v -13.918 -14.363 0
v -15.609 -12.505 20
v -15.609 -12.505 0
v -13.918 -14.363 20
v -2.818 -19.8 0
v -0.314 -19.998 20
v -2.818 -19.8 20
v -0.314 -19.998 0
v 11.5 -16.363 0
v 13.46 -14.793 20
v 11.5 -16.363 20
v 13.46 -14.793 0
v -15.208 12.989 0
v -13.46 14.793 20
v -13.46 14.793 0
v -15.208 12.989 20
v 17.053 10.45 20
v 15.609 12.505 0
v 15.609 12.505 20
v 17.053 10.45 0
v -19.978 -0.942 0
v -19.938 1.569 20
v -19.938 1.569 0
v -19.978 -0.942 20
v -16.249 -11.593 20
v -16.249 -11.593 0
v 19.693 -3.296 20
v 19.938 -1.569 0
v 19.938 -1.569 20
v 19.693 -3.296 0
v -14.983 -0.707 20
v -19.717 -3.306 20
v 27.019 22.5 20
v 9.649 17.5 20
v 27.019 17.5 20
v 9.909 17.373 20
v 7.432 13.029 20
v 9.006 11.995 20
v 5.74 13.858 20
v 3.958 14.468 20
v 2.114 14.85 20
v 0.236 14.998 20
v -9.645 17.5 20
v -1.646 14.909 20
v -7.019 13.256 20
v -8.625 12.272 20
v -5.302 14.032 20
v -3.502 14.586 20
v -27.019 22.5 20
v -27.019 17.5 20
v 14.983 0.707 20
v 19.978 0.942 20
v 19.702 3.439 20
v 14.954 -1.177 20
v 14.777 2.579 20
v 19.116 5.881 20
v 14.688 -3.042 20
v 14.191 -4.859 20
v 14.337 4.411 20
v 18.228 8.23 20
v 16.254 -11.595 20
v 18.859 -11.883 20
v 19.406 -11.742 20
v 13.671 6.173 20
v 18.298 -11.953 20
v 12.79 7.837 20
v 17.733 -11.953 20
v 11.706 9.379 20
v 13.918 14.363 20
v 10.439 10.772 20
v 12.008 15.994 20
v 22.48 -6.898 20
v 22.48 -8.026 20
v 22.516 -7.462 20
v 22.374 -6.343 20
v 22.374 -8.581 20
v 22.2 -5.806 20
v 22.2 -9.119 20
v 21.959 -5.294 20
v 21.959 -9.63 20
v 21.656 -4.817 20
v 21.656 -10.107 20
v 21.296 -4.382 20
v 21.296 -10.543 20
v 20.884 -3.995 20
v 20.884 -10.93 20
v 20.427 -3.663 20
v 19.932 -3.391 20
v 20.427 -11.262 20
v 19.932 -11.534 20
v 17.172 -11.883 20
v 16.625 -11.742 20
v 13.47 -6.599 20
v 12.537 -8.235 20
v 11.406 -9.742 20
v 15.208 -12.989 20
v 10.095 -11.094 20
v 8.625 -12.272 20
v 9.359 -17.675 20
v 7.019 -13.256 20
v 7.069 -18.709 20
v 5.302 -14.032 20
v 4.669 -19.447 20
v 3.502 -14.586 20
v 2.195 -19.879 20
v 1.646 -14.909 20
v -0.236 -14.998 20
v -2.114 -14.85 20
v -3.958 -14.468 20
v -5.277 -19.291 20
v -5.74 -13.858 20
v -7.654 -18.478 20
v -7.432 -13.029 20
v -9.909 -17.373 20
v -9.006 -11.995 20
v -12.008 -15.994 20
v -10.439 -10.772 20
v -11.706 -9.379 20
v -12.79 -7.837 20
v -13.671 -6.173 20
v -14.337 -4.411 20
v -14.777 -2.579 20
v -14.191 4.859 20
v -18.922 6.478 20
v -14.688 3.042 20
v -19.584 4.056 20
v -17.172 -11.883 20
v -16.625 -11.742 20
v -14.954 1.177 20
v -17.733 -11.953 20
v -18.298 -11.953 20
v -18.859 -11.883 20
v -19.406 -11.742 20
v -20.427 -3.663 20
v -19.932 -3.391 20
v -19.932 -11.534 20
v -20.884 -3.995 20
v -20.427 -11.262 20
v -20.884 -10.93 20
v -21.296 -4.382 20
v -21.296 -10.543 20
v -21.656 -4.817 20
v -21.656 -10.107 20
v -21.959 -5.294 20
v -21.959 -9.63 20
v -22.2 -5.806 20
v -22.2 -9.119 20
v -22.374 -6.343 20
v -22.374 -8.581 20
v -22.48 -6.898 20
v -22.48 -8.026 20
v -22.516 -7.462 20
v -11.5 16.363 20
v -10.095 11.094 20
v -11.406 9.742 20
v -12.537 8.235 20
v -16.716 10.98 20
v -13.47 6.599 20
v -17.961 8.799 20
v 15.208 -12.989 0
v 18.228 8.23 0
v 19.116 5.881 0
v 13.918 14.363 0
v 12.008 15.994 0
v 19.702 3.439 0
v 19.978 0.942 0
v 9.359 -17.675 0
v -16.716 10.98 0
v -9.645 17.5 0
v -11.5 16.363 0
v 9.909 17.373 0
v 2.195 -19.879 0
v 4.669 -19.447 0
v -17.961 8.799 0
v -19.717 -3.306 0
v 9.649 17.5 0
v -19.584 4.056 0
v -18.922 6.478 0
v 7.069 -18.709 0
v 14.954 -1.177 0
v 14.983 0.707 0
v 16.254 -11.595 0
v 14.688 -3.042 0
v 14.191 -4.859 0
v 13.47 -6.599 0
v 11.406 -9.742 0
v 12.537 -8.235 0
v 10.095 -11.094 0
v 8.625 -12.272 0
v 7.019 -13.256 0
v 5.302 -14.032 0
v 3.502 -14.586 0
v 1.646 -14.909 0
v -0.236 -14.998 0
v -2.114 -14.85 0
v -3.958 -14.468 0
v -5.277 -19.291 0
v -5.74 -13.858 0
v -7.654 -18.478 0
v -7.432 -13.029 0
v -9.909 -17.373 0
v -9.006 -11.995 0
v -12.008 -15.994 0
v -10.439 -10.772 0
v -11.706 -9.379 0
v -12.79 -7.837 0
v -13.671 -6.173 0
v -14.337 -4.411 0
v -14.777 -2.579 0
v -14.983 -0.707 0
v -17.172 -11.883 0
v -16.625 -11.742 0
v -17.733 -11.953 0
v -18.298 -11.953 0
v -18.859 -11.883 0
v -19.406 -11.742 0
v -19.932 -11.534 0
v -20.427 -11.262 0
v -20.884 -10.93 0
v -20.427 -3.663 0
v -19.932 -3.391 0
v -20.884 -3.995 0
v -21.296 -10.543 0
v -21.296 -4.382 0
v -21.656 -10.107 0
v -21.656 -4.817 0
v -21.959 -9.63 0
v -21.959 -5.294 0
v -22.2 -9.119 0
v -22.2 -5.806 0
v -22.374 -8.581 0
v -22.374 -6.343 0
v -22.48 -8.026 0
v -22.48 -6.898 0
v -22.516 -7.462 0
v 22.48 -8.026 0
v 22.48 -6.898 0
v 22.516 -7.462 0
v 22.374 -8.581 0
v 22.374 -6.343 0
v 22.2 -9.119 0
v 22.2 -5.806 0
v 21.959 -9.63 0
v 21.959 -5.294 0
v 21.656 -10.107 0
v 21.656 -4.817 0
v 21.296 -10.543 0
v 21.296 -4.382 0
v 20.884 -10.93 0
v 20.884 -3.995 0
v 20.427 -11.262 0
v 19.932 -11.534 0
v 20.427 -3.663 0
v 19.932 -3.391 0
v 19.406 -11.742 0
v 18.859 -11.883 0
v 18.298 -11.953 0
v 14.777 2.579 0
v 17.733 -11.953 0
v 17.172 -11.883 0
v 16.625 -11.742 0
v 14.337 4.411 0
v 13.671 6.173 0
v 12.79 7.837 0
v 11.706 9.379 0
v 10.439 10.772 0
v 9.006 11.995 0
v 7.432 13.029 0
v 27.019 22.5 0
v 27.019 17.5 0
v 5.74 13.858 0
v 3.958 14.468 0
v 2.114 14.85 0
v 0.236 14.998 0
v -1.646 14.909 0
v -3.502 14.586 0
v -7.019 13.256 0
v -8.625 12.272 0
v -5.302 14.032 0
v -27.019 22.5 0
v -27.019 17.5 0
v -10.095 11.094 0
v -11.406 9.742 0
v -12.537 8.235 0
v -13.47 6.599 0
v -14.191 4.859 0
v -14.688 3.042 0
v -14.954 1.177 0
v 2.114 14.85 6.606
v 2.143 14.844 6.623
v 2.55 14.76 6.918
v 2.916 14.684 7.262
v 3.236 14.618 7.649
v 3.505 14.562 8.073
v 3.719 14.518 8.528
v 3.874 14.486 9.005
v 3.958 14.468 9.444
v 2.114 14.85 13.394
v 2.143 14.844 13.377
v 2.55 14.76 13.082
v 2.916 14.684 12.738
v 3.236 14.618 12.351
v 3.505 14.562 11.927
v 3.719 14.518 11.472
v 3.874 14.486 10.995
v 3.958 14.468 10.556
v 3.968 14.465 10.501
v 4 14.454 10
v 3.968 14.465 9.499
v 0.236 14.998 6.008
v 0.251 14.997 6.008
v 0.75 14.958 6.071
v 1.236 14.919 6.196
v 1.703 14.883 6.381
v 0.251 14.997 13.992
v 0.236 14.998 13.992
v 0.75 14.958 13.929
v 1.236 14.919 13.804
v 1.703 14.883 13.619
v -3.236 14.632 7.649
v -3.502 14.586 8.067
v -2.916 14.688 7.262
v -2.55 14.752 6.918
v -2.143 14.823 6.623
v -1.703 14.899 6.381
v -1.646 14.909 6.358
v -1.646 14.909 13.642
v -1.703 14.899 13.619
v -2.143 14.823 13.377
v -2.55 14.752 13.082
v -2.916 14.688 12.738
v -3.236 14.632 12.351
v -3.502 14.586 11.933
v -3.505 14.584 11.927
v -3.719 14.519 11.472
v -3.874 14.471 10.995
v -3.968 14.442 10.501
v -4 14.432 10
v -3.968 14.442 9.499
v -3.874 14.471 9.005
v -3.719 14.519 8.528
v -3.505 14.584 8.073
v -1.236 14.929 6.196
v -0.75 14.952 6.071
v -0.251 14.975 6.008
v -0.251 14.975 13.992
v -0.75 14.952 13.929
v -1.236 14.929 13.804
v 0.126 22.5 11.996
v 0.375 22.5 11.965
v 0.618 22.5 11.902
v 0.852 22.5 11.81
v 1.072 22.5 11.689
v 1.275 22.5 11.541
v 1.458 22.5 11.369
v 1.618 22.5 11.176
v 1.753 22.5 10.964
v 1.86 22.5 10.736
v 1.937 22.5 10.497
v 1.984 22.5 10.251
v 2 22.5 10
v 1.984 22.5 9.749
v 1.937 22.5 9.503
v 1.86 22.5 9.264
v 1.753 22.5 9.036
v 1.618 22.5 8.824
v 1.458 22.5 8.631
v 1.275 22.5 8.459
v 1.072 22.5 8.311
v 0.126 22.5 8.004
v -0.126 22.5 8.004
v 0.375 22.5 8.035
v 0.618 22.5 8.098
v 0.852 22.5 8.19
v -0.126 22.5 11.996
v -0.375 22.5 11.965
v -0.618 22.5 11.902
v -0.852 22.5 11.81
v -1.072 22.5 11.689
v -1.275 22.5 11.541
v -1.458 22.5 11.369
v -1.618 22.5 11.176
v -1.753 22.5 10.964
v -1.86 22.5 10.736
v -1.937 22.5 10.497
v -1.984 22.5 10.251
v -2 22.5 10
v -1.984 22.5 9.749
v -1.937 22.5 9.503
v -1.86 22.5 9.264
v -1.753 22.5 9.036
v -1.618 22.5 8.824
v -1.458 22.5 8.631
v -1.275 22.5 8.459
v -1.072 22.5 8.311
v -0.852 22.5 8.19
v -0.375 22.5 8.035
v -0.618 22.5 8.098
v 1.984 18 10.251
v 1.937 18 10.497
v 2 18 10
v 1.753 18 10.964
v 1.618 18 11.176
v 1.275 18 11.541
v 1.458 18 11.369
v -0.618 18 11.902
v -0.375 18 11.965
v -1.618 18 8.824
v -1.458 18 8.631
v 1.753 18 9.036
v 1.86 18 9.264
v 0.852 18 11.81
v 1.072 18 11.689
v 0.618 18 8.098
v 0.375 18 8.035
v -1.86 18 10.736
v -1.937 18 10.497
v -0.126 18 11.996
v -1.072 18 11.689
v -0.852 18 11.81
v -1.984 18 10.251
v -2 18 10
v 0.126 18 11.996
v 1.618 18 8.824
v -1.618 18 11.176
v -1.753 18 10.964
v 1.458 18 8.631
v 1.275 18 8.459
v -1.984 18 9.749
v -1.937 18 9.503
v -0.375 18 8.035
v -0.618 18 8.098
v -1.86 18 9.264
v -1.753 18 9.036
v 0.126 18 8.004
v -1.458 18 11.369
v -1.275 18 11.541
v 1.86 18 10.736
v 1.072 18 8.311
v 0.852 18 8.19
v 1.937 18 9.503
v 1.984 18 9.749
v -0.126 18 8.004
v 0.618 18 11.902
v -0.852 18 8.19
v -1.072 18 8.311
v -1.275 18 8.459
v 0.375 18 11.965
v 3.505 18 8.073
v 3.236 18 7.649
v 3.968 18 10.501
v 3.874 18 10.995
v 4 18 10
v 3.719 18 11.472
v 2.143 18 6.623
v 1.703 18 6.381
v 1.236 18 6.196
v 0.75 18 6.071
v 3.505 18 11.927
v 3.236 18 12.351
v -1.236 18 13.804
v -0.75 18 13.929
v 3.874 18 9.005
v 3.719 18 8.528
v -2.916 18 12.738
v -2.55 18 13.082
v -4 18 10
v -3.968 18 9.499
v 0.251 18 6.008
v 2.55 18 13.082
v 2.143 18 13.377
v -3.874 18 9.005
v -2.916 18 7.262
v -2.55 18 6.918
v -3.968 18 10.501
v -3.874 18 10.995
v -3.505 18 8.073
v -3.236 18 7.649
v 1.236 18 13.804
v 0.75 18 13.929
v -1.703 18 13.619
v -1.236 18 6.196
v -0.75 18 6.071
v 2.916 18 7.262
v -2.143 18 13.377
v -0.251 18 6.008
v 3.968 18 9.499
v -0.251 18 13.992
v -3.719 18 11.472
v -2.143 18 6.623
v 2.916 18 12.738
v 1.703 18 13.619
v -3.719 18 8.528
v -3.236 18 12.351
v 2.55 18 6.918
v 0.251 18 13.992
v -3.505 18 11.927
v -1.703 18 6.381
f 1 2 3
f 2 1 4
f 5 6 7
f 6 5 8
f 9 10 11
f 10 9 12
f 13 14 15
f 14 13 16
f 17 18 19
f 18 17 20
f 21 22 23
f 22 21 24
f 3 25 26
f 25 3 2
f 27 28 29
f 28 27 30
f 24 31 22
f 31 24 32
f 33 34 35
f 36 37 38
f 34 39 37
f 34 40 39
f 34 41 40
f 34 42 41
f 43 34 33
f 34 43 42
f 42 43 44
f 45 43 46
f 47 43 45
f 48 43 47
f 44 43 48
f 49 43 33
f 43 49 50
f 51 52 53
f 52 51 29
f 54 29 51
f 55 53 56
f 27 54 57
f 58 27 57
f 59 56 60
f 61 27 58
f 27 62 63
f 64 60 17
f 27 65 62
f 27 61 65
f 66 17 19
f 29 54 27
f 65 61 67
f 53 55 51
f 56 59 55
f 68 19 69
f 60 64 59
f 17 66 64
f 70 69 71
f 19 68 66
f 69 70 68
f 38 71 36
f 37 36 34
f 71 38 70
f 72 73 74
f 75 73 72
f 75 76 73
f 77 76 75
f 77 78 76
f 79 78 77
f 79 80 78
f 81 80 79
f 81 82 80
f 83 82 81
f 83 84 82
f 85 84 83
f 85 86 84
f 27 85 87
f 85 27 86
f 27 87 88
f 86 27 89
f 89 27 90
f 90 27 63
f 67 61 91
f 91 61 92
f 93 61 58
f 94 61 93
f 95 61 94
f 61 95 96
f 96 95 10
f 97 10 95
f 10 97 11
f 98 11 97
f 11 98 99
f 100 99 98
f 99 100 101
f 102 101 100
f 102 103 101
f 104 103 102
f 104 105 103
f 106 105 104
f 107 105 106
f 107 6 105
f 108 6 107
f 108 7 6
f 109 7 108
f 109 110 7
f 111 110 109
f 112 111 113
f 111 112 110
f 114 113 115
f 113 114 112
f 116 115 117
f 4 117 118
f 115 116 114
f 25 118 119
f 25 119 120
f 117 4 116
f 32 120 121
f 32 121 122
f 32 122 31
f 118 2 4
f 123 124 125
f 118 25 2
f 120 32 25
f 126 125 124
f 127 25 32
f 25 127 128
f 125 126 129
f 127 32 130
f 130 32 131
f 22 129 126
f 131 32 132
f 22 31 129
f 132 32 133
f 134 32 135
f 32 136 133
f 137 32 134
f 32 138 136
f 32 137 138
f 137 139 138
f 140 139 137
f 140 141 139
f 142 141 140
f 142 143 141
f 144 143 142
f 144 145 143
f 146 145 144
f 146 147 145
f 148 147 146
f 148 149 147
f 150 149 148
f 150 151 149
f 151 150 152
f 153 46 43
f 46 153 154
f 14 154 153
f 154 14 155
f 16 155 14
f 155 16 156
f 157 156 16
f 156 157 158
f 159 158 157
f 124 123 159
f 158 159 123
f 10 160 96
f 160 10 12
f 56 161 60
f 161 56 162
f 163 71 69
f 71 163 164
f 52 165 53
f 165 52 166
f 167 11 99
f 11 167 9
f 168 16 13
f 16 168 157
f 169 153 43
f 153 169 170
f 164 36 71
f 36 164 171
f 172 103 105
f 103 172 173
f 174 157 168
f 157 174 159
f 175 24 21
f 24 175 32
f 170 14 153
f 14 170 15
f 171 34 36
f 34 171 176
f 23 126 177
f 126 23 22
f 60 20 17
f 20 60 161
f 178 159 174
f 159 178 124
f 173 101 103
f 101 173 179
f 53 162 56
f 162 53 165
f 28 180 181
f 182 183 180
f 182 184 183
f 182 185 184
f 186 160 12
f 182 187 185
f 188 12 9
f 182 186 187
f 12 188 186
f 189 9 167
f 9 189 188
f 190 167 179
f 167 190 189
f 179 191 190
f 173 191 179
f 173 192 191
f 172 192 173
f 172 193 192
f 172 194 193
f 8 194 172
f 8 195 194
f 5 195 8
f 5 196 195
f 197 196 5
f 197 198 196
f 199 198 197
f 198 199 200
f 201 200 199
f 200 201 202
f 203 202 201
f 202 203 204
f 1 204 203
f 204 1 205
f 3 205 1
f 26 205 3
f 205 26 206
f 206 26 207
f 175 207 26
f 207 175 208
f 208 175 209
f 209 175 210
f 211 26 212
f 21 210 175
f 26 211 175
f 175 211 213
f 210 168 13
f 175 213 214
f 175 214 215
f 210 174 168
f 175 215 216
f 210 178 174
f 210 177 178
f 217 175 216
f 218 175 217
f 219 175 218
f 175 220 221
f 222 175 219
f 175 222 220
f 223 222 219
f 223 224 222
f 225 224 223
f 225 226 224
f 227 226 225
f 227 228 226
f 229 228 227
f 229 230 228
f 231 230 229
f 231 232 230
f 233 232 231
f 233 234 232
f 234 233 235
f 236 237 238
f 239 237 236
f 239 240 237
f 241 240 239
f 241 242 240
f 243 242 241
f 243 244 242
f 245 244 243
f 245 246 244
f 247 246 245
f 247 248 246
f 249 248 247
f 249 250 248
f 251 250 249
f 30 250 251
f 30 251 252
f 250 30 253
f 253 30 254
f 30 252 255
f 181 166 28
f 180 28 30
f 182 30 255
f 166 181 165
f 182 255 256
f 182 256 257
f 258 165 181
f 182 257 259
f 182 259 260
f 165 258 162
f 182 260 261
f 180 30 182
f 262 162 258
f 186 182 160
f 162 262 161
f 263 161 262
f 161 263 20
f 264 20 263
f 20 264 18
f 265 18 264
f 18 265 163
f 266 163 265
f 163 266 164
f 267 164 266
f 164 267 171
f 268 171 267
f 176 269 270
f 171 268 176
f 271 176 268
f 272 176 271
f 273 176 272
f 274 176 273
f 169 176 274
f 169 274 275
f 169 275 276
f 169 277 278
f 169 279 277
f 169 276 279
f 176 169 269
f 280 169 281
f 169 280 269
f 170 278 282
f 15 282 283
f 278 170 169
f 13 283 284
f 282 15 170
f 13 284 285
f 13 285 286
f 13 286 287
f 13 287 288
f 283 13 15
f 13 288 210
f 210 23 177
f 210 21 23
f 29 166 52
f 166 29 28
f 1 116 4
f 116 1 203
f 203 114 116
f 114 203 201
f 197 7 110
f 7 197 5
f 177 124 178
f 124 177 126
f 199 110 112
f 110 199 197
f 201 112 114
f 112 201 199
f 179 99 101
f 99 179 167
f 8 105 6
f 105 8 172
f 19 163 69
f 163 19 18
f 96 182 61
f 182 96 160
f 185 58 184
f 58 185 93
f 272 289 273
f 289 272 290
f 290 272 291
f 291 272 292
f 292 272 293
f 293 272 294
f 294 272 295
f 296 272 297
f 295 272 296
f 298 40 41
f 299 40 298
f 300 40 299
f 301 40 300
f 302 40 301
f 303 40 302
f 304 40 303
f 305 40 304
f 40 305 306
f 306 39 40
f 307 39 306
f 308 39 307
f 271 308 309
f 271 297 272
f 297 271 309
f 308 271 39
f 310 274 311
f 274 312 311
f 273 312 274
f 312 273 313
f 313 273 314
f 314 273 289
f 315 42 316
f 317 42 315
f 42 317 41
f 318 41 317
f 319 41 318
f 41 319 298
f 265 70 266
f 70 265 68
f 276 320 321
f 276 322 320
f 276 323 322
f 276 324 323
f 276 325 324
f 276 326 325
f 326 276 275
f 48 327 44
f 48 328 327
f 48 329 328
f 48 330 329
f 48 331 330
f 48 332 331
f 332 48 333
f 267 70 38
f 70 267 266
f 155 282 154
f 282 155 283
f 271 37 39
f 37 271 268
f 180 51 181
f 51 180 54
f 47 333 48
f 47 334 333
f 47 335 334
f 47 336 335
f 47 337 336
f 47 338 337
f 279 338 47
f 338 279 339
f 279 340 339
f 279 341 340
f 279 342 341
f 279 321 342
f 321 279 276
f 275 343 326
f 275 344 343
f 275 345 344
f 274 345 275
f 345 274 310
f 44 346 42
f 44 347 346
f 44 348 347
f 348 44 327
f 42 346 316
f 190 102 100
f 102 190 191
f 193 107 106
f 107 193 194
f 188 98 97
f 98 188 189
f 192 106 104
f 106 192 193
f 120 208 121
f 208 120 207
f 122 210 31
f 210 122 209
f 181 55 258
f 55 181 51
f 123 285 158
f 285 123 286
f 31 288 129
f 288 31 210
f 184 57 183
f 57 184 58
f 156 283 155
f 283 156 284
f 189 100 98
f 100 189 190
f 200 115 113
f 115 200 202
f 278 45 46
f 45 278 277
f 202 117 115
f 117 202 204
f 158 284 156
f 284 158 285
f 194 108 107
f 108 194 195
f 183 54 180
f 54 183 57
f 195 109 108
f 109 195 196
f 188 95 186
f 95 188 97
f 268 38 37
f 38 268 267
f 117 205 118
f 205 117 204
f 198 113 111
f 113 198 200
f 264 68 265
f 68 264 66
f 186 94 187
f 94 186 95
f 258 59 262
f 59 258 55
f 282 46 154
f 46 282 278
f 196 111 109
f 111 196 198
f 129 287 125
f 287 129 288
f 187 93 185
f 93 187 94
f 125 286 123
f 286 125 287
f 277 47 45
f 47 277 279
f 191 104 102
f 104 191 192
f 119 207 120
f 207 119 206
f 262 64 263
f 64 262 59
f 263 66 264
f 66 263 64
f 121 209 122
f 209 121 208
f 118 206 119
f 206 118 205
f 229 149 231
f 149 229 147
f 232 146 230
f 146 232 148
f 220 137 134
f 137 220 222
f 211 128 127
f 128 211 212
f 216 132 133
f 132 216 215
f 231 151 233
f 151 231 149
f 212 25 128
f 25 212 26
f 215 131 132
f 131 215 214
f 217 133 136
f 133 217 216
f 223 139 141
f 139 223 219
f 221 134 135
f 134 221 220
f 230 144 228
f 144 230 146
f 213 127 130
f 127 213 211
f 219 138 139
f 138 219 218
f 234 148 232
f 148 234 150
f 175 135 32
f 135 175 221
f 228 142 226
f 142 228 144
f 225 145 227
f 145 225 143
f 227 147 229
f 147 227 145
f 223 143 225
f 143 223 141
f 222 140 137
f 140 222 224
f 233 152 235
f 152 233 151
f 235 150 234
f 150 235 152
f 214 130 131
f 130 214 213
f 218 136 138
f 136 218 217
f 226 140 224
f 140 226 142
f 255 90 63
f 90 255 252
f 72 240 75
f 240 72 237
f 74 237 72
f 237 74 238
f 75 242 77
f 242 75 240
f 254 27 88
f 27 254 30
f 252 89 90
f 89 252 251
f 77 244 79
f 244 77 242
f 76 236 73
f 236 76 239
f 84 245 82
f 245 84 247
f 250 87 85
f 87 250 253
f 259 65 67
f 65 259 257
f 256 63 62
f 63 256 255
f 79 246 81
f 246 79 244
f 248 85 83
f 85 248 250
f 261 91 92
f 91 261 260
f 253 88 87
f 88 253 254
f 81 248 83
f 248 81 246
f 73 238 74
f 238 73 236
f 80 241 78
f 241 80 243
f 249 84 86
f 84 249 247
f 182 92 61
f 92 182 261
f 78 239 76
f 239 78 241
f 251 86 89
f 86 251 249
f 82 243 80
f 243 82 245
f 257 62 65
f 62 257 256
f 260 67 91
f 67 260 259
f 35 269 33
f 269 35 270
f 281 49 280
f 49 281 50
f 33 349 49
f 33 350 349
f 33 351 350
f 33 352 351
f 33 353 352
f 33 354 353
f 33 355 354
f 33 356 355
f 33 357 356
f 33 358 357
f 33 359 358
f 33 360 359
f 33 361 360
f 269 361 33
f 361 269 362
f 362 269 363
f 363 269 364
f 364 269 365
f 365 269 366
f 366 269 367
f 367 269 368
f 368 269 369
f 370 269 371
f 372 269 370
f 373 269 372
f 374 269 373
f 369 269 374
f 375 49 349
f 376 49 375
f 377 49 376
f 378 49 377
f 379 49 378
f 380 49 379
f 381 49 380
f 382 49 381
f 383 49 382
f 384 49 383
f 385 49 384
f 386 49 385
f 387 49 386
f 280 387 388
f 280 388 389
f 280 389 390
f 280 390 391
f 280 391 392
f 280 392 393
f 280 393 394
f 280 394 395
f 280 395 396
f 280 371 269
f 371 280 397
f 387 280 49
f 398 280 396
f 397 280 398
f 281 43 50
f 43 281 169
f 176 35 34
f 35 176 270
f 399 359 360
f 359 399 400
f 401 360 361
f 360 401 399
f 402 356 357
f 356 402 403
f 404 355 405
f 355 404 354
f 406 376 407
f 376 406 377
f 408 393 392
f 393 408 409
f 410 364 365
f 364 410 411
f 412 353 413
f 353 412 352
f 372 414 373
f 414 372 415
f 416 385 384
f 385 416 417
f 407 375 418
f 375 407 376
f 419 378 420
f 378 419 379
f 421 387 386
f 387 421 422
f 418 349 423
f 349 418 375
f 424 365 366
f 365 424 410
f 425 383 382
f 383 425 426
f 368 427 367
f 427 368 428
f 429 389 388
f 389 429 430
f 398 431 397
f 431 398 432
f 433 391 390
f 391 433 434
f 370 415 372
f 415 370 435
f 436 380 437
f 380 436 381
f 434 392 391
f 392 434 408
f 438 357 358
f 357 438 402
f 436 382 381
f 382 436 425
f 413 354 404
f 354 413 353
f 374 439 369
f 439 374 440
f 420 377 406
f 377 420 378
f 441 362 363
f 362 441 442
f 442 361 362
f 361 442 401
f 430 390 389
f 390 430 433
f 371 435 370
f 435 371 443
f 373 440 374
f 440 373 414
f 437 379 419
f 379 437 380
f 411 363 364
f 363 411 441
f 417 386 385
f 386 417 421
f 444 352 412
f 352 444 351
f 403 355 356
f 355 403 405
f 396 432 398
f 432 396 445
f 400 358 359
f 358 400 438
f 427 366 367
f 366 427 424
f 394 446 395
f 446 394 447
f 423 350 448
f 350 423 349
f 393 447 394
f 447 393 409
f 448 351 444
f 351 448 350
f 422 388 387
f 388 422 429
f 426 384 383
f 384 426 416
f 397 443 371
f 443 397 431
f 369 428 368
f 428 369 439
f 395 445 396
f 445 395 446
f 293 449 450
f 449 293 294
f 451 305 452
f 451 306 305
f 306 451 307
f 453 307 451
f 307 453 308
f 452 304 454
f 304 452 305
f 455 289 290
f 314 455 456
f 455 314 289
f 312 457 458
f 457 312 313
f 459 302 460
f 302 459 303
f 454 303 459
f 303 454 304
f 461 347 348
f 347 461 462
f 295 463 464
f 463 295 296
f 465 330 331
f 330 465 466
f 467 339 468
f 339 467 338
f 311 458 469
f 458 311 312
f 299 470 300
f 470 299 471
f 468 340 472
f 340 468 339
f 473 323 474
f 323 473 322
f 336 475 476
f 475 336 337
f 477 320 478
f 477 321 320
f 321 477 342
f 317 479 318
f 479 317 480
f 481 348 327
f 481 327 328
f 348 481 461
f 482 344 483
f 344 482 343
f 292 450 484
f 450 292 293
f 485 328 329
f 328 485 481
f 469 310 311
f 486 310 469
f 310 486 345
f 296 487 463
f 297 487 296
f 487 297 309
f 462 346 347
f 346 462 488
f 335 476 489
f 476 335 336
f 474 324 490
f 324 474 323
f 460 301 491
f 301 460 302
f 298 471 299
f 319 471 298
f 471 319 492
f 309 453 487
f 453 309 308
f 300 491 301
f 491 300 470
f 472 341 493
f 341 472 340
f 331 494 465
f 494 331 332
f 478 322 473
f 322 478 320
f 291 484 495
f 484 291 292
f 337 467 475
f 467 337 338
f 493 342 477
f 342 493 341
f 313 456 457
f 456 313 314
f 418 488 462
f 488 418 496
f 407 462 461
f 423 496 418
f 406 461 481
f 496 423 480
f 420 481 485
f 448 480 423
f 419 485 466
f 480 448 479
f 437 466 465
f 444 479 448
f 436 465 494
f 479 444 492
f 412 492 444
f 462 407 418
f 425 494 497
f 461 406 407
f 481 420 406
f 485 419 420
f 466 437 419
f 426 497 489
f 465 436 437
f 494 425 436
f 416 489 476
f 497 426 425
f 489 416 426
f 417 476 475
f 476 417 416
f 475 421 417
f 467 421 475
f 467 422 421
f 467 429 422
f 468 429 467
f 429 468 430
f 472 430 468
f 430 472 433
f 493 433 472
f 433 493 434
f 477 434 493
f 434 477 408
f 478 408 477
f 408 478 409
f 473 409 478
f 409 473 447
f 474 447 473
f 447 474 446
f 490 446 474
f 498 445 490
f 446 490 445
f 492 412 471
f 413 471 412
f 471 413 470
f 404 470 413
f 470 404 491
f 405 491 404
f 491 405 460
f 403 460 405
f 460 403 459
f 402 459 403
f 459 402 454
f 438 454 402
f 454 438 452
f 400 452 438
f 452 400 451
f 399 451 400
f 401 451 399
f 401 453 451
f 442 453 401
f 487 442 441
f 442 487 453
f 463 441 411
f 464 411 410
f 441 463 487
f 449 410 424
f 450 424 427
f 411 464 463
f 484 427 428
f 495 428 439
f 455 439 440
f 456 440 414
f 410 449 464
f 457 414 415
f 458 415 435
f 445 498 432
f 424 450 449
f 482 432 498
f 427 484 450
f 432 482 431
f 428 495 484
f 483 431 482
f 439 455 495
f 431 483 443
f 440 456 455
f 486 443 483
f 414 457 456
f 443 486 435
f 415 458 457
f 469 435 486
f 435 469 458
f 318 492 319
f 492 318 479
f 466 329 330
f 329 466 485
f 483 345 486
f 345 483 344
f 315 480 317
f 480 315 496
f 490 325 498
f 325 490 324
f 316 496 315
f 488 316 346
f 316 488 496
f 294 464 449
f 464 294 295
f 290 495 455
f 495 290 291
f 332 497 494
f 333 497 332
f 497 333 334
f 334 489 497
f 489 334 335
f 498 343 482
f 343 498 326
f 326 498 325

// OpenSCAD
// Custom wall tube holder
// By Magonegro SEP-2016

// Inner diameter:
DIAMETER=30;
// Height:
HEIGHT=20;
// Thickness:
THICKNESS=5;
// Aperture angle (typ. 140º):
ANGLE=135;
// Hole diameter (mm):
HOLEDIAMETER=4;
// # Holders:
HOLDERS=1;
// Resolution
FACETS=50;

/* [Hidden] */
module arc( height, depth, radius, degrees ) 
{
    render() 
    {
        difference() 
        {
            rotate_extrude(angle=100,$fn = FACETS)
                translate([radius - height, 0, 0])
                    square([height,depth]);
            translate([0,-(radius+1),-.5]) 
                cube([radius+1,(radius+1)*2,depth+1]);
            rotate([0,0,180-degrees]) 
                translate([0,-(radius+1),-.5]) 
                    cube([radius+1,(radius+1)*2,depth+1]);
        }
    }
}

// Some variables
R2=(THICKNESS/2)*1.8; // Gripper radius
R=(DIAMETER/2)+R2; // Radius for the center of the grippers
XX=R*sin(ANGLE/2); // X coordinate of the center of the grippers
YY=R*cos(ANGLE/2); // Y coordinate of the center of the grippers

union()
{
    for (holder=[0:HOLDERS-1])
    {
        translate([((XX+R2)*1.2*2-0.1)*holder,0,0])
        difference()
        {
            union()
            {
                difference()
                {
                    rotate([0,0,ANGLE/2]) 
                        difference()
                        {
                        cylinder(r=DIAMETER/2+THICKNESS,h=HEIGHT,$fn=FACETS);
                        translate([0,0,-1]) cylinder(r=DIAMETER/2,h=HEIGHT+2,$fn=FACETS);
                        }
                    rotate([0,0,ANGLE/2]) 
                        translate([0,0,-1]) 
                            arc(THICKNESS+2,HEIGHT+2,DIAMETER/2+THICKNESS+1,ANGLE);
                }
                translate([-XX,-YY,0]) cylinder(r=R2,h=HEIGHT,$fn=FACETS);
                translate([XX,-YY,0]) cylinder(r=R2,h=HEIGHT,$fn=FACETS);
                // Support to wall
                translate([-(XX+R2)*1.2,(DIAMETER+THICKNESS)/2,0]) 
                    cube([(XX+R2)*1.2*2,THICKNESS,HEIGHT]);
            }
            // Screw holes allowing for the screw head
            translate([0,(DIAMETER+THICKNESS)/2+THICKNESS+0.5,HEIGHT/2])
            rotate([90,0,0])
            union()
            {
                cylinder(r=HOLEDIAMETER/2,h=HEIGHT,$fn=FACETS);
                translate([0,0,THICKNESS]) 
                    cylinder(r=HOLEDIAMETER,h=HEIGHT,$fn=FACETS);
            }
        }
    }
}
